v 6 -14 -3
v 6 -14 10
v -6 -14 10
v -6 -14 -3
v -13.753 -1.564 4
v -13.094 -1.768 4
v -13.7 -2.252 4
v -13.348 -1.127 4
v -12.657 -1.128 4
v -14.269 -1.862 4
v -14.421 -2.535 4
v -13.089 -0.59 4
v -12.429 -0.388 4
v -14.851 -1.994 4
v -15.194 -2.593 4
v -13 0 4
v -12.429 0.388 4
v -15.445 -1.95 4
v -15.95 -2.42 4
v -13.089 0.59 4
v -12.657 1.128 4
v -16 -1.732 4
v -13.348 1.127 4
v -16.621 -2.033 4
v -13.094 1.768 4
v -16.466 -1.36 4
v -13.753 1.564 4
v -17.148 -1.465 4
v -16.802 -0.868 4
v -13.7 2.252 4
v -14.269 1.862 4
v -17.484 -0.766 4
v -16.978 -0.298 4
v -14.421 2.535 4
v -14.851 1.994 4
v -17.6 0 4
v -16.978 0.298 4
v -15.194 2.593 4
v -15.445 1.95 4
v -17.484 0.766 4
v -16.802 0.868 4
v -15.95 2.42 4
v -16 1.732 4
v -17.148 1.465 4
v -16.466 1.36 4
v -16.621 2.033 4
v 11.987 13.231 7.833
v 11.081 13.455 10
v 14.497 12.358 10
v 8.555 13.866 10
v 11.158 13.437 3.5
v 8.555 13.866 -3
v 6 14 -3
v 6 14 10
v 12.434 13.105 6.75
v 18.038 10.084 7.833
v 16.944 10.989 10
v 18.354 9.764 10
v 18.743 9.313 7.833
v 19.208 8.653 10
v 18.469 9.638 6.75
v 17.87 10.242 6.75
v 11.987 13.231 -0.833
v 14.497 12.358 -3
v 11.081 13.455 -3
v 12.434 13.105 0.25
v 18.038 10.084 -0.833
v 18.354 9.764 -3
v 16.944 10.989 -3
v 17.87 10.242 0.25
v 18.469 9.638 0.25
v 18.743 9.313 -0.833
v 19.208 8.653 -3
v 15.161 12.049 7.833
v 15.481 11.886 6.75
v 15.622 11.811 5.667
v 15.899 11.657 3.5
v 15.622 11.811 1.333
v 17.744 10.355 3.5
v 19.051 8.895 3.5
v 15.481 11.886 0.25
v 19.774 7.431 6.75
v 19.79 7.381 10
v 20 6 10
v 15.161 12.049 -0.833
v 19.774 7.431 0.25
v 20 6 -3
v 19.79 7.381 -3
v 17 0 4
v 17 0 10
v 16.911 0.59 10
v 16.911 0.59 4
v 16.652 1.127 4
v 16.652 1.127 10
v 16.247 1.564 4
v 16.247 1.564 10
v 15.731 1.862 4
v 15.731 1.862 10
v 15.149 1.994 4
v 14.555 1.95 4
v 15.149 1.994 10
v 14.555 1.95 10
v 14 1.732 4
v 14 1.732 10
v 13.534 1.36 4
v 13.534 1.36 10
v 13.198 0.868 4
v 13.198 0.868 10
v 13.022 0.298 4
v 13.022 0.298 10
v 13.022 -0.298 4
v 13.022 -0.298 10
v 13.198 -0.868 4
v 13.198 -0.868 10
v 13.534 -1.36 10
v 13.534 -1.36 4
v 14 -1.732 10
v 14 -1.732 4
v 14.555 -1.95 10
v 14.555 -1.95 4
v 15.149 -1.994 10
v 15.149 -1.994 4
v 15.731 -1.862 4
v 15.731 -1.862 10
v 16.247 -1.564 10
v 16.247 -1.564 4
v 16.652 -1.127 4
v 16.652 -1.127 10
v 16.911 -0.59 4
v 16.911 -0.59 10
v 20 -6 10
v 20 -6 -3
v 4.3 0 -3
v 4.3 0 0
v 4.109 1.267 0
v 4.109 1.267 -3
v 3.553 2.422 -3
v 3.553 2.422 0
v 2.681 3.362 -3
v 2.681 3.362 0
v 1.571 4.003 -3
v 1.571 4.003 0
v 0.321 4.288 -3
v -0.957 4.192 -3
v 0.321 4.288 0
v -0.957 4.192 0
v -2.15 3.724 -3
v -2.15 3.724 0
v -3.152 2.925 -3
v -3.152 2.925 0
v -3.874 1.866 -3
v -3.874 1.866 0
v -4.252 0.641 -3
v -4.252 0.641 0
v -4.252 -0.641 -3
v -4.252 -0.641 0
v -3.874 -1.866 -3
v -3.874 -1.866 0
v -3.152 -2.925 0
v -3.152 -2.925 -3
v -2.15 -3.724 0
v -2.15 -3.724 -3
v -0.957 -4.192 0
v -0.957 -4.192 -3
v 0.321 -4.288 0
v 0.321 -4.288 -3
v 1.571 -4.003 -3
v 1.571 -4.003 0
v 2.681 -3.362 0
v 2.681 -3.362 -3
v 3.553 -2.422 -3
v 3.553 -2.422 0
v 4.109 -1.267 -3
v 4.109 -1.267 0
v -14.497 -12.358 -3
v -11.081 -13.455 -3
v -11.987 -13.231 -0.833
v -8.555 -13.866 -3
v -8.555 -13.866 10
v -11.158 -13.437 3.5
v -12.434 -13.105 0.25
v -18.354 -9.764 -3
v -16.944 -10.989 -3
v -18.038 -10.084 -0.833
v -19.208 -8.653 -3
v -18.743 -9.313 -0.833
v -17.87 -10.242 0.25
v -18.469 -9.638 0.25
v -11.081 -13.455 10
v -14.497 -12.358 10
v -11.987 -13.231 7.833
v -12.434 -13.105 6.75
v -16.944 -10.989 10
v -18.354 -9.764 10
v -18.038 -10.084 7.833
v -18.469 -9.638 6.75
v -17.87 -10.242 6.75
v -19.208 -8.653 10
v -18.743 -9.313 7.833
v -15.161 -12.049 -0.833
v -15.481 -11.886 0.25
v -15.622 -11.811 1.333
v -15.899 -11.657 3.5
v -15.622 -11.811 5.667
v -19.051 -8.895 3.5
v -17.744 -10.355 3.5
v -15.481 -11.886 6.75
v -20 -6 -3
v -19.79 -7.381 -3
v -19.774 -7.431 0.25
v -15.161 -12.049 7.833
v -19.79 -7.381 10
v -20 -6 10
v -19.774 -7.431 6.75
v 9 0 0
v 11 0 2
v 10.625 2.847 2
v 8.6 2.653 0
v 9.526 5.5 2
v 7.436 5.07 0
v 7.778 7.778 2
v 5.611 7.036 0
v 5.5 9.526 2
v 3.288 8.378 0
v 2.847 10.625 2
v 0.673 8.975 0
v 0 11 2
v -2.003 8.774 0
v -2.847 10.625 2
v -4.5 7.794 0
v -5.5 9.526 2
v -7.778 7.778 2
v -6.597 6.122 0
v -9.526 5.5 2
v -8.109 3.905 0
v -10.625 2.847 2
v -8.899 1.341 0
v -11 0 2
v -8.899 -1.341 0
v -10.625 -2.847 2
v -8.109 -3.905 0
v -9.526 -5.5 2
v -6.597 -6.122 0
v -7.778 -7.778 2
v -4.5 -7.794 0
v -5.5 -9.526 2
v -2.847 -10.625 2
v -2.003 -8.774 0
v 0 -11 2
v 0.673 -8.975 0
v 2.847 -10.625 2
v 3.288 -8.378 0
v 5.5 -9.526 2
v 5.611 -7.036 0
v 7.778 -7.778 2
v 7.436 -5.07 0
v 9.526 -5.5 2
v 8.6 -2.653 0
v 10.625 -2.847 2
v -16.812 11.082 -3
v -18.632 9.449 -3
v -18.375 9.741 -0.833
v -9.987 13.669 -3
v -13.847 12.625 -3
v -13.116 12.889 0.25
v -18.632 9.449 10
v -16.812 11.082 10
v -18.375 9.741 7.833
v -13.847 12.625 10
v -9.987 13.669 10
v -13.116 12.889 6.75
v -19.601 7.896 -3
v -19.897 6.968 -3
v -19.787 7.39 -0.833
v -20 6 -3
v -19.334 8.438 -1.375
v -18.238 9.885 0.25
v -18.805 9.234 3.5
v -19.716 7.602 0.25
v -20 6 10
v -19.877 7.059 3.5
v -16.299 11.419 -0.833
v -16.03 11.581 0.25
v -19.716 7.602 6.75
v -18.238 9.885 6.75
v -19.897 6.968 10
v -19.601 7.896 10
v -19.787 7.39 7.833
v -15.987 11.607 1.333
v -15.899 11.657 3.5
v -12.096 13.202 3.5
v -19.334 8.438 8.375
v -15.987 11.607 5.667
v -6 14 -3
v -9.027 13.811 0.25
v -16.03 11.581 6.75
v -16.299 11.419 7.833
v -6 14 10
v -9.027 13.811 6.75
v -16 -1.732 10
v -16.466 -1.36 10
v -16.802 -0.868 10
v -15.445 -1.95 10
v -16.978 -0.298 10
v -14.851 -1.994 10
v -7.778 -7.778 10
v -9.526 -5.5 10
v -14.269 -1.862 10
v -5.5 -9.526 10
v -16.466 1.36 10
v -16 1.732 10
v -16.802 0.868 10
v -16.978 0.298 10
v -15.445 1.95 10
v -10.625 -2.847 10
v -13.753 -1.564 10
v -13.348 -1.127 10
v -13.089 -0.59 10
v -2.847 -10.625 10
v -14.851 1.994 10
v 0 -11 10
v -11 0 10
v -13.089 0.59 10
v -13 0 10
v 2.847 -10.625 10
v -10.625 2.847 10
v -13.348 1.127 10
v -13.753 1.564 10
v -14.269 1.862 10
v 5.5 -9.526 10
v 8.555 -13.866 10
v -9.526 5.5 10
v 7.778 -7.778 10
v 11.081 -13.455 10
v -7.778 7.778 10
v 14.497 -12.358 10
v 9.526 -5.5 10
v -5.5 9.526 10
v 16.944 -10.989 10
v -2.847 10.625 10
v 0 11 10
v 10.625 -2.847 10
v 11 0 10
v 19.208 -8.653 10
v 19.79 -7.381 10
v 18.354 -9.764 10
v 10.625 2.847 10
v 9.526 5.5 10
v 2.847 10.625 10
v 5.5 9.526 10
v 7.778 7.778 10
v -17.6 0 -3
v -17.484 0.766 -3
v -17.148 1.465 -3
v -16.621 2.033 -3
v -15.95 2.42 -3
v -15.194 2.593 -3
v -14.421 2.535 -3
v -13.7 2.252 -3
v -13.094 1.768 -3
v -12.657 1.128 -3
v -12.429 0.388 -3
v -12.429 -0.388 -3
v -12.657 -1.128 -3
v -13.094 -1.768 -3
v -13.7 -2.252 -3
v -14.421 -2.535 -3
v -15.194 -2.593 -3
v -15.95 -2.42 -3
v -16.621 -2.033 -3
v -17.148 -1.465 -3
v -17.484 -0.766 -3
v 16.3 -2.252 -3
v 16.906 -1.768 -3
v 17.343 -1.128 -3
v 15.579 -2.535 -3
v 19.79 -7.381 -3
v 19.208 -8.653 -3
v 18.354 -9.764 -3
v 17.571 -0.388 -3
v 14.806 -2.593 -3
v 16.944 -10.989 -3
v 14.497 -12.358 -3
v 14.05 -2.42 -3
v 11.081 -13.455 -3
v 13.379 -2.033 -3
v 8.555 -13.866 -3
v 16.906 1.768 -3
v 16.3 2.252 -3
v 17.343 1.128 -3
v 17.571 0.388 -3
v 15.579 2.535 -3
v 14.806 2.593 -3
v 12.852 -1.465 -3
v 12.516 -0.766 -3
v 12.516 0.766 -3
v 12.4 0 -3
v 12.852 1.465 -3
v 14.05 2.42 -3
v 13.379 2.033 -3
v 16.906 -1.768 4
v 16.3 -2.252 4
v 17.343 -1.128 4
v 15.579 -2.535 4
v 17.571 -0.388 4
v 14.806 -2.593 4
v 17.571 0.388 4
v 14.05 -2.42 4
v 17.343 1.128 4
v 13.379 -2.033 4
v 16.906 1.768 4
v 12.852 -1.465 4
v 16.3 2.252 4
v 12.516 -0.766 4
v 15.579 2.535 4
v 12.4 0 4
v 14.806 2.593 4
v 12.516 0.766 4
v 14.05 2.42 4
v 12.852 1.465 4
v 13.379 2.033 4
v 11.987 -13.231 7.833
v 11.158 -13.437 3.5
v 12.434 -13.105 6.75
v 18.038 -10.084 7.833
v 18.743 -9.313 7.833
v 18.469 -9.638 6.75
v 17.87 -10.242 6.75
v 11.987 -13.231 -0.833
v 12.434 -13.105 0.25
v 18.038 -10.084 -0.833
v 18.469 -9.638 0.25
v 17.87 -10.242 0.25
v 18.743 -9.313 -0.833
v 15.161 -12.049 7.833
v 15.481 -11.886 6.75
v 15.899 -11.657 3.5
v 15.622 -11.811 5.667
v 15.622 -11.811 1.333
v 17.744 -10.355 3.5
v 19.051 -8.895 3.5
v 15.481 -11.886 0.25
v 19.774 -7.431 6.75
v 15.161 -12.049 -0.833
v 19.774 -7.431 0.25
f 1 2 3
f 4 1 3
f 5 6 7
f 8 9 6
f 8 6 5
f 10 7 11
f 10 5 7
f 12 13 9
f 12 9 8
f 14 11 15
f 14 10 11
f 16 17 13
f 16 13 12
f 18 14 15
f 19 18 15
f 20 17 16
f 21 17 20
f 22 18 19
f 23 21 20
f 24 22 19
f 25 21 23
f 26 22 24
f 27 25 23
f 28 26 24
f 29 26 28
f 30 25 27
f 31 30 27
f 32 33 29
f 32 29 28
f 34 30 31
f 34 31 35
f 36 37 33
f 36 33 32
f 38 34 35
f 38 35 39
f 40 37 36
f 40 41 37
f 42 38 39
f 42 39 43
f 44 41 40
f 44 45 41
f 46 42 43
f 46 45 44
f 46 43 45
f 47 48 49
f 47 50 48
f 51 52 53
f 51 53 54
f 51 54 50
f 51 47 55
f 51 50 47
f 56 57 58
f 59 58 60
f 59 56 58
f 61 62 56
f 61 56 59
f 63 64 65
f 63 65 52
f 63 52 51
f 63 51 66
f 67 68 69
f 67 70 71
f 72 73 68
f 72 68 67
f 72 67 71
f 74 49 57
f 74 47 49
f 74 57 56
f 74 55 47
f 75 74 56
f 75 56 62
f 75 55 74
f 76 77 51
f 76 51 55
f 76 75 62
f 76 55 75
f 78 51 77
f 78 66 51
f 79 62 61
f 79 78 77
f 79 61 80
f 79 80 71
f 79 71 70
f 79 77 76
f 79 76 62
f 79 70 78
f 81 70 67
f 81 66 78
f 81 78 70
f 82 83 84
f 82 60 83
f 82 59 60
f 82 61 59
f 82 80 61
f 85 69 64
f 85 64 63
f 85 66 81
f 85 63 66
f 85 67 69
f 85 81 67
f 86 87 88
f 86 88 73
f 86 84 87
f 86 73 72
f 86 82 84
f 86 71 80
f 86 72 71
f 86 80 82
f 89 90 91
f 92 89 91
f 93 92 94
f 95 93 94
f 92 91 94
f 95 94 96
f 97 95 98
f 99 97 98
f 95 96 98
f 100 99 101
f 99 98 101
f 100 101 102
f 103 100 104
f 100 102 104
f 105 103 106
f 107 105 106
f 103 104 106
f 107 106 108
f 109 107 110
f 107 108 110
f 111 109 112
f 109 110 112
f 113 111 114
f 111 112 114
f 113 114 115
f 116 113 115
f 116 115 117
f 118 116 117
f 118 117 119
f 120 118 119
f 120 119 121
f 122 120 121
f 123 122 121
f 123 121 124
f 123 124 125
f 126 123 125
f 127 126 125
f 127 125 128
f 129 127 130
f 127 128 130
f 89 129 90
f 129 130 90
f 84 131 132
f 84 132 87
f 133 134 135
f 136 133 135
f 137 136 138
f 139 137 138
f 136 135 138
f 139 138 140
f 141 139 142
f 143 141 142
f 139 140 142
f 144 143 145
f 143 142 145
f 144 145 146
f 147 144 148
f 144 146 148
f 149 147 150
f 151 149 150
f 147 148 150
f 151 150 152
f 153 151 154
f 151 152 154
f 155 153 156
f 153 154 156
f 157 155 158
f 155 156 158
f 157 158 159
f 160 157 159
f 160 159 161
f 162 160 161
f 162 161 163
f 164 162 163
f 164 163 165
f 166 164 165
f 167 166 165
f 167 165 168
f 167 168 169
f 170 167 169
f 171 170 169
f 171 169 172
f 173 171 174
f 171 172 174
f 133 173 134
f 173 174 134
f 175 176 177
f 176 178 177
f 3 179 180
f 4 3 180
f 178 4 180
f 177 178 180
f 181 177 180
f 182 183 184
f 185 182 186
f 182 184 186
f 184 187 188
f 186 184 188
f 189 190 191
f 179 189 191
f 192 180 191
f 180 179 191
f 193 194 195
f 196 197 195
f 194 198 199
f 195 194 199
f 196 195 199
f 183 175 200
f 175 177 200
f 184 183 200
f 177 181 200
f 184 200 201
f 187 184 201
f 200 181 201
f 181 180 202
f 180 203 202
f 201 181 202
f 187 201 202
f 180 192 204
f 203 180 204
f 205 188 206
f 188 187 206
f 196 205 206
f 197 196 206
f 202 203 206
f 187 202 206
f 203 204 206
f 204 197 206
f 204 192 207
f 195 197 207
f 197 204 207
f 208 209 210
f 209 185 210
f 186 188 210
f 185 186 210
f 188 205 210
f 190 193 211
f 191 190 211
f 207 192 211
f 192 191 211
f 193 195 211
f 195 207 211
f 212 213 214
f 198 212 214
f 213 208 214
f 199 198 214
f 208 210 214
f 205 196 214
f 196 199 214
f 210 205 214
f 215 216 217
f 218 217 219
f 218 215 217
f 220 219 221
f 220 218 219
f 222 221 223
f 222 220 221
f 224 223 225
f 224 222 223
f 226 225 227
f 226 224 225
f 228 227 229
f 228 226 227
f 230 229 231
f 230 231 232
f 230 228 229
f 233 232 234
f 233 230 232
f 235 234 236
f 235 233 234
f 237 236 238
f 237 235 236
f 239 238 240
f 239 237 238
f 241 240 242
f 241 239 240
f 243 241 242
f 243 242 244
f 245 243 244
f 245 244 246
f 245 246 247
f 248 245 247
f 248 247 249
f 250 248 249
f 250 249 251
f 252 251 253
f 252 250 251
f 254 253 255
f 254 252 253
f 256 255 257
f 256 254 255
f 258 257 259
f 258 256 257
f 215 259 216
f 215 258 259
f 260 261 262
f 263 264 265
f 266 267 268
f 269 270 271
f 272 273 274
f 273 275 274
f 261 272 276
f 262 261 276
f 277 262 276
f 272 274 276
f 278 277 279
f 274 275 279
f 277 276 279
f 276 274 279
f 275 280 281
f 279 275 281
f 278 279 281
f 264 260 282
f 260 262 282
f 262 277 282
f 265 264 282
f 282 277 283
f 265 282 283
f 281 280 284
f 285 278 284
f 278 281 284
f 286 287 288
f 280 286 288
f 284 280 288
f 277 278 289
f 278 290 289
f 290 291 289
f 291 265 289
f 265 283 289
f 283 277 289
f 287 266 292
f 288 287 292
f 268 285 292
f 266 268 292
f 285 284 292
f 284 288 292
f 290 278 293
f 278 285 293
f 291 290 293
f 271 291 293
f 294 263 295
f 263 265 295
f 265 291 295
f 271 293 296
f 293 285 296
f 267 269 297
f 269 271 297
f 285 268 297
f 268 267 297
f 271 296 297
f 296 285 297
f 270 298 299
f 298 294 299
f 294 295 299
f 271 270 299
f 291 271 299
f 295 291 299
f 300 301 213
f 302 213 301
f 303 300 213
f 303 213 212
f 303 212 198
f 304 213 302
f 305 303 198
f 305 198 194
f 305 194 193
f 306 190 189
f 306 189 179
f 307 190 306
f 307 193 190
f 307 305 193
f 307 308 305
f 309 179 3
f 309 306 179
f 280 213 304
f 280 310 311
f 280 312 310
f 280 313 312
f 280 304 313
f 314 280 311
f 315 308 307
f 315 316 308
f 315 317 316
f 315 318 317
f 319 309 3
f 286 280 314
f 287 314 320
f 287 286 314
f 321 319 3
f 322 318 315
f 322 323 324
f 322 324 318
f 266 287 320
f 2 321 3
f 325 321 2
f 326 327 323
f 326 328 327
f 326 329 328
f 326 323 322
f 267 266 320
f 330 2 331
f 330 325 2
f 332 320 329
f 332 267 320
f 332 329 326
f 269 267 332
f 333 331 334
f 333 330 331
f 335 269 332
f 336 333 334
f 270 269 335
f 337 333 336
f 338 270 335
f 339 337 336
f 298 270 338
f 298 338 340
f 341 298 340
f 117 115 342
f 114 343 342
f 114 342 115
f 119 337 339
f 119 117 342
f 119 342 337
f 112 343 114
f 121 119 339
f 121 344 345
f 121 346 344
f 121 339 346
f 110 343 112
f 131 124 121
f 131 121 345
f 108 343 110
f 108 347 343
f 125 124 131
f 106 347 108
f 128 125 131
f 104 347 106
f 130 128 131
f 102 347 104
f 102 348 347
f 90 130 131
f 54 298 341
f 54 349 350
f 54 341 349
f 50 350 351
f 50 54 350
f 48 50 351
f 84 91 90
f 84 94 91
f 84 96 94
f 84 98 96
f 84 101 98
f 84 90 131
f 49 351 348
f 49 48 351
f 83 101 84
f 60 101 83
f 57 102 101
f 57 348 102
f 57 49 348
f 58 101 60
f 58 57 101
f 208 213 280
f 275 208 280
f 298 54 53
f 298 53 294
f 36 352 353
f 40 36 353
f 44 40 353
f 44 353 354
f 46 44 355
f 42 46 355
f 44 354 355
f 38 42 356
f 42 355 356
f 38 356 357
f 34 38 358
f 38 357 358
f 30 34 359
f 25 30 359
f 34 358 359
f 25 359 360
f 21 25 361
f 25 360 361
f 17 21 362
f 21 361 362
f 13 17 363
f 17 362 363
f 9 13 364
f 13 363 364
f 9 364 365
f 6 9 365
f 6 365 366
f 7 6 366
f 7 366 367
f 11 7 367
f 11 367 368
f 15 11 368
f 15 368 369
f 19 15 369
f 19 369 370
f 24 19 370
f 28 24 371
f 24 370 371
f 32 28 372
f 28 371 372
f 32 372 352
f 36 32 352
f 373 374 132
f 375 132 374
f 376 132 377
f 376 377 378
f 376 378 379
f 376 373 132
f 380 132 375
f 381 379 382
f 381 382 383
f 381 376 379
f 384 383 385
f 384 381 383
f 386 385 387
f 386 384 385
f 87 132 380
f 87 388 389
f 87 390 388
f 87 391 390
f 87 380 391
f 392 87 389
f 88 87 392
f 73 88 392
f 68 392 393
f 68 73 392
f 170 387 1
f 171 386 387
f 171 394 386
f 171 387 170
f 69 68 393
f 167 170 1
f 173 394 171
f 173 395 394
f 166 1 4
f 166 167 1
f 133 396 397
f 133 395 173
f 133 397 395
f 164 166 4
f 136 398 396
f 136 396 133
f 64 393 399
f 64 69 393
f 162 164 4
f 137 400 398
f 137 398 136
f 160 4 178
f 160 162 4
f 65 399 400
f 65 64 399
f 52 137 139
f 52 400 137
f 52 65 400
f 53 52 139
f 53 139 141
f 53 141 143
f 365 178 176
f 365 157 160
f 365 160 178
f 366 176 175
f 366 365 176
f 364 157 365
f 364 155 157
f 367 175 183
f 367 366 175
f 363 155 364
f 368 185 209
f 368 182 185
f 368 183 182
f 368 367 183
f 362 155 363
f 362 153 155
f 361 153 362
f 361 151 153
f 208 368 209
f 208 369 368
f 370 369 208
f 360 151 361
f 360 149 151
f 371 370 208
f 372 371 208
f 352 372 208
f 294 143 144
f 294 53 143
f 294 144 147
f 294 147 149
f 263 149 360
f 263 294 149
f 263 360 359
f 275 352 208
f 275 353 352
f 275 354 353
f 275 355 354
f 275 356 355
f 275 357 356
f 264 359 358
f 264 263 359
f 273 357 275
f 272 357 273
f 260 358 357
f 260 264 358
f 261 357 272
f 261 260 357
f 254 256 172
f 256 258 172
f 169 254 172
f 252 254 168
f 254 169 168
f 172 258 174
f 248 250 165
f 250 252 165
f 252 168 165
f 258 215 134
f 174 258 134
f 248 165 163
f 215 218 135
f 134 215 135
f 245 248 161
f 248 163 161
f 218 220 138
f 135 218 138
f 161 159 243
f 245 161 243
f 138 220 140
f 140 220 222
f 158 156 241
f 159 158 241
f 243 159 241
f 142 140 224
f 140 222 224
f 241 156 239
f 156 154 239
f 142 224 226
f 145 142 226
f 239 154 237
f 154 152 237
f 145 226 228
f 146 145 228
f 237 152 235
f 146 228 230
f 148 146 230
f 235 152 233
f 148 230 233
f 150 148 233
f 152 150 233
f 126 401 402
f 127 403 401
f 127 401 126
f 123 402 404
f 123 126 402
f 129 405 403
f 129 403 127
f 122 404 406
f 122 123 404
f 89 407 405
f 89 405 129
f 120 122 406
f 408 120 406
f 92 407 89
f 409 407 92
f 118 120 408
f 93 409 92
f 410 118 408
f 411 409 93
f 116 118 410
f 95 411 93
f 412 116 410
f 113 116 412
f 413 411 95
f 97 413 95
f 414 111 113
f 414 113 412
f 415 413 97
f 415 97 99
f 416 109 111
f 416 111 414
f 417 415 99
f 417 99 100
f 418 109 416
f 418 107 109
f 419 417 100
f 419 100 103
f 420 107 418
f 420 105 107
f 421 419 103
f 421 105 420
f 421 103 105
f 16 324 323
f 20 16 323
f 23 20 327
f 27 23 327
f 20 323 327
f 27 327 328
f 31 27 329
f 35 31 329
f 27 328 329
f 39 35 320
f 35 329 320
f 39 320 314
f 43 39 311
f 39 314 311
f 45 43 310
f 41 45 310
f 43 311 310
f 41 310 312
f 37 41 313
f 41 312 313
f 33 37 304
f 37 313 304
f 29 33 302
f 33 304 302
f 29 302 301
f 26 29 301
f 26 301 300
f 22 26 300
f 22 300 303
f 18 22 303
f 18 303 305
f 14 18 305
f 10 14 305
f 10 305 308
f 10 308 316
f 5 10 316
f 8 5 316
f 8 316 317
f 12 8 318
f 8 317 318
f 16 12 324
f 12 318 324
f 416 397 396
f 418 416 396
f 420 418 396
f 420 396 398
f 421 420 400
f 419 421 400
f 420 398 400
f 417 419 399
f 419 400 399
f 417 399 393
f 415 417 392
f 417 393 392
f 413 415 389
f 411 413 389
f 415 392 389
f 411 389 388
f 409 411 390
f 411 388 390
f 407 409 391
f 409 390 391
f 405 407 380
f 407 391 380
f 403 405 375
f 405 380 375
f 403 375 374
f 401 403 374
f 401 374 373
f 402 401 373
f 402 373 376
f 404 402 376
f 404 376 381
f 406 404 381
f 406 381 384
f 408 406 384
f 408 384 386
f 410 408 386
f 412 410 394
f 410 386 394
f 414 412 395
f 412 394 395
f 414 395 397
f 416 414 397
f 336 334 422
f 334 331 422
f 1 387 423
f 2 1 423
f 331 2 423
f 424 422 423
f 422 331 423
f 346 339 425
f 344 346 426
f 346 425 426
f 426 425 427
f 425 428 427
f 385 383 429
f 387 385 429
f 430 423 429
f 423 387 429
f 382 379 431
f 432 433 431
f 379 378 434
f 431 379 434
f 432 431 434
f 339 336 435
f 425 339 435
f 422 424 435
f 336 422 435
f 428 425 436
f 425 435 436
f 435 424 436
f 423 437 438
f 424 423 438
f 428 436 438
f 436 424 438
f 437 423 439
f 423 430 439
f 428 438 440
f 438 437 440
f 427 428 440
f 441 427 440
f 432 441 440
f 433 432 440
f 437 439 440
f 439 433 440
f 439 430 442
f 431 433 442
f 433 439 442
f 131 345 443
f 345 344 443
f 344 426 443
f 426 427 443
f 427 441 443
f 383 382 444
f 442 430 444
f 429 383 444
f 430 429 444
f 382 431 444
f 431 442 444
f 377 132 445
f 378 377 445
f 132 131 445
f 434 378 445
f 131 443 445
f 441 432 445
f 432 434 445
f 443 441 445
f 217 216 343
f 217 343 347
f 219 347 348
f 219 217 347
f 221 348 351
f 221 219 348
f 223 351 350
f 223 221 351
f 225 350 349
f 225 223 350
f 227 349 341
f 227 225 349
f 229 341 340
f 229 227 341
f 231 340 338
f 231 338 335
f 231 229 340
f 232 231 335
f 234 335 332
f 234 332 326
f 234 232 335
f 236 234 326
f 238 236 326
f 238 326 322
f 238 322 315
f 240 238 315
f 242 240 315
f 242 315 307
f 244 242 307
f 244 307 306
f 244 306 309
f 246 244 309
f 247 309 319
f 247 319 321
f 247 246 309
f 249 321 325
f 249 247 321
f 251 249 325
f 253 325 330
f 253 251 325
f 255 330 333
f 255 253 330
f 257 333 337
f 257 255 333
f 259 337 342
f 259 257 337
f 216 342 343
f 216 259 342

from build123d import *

# Parameters (mm, degrees)
SZKIC1_W                    = 40
SZKIC1_H                    = 28
SZKIC1_R                    = 11
DODANIE_WYCI_GNI_CIE1_DEPTH = 10
SZKIC2_W                    = 40
SZKIC2_H                    = 28
DODANIE_WYCI_GNI_CIE2_DEPTH = 3
SFAZOWANIE1_SIZE            = 2
SZKIC3_R                    = 4.3
WYTNIJ_WYCI_GNI_CIE1_DEPTH  = 3
SZKIC4_R                    = 2
WYTNIJ_WYCI_GNI_CIE2_DEPTH  = 6
ZAOKR_GLENIE1_SIZE          = 14
ZAOKR_GLENIE1_SIZE_2        = 8
ZAOKR_GLENIE2_SIZE          = 14
ZAOKR_GLENIE2_SIZE_2        = 8
SZKIC5_R                    = 2.6
WYTNIJ_WYCI_GNI_CIE3_DEPTH  = 7


with BuildPart() as part:
    # Szkic1 → Dodanie-wyciągnięcie1 (new body)
    with BuildSketch(Plane.XY):
        Rectangle(SZKIC1_W, SZKIC1_H)
        Circle(SZKIC1_R, mode=Mode.SUBTRACT)
    extrude(amount=DODANIE_WYCI_GNI_CIE1_DEPTH)

    # Szkic2 → Dodanie-wyciągnięcie2 (add)
    with BuildSketch(Plane(origin=(0, 0, 0), x_dir=(-1, 0, 0), z_dir=(0, 0, -1))):
        Rectangle(SZKIC2_W, SZKIC2_H)
    extrude(amount=DODANIE_WYCI_GNI_CIE2_DEPTH)

    # Sfazowanie1
    sfazowanie1_edges = [part.edges().sort_by_distance(p)[0] for p in [
        (-11, 0, 0),
    ]]
    chamfer(sfazowanie1_edges, length=SFAZOWANIE1_SIZE)

    # Szkic3 → Wytnij-wyciągnięcie1 (cut)
    with BuildSketch(Plane.XY):
        Circle(SZKIC3_R)
    extrude(amount=-WYTNIJ_WYCI_GNI_CIE1_DEPTH, mode=Mode.SUBTRACT)

    # Szkic4 → Wytnij-wyciągnięcie2 (cut)
    with BuildSketch(Plane.XY.offset(10)):
        with Locations((-15, 0)):
            Circle(SZKIC4_R)
        with Locations((15, 0)):
            Circle(SZKIC4_R)
    extrude(amount=-WYTNIJ_WYCI_GNI_CIE2_DEPTH, mode=Mode.SUBTRACT)

    # Zaokrąglenie1
    # an asymmetric fillet: 14, 8 mm, written as the material it takes off along each edge
    with BuildSketch(Plane(origin=(20, -14, -38), x_dir=(-1, 0, 0), z_dir=(0, 0, 1))) as zaokr_glenie1_piece_1:
        with BuildLine():
            Bezier((ZAOKR_GLENIE1_SIZE, 0), (0, 0), (0, -ZAOKR_GLENIE1_SIZE_2), weights=[1, 0.707106781, 1])
            Line((0, -ZAOKR_GLENIE1_SIZE_2), (0, 0))
            Line((0, 0), (ZAOKR_GLENIE1_SIZE, 0))
        make_face()
    extrude(amount=83, mode=Mode.SUBTRACT)
    with BuildSketch(Plane(origin=(-20, 14, 45), x_dir=(0, -1, 0), z_dir=(0, 0, -1))) as zaokr_glenie1_piece_2:
        with BuildLine():
            Bezier((ZAOKR_GLENIE1_SIZE_2, 0), (0, 0), (0, -ZAOKR_GLENIE1_SIZE), weights=[1, 0.707106781, 1])
            Line((0, -ZAOKR_GLENIE1_SIZE), (0, 0))
            Line((0, 0), (ZAOKR_GLENIE1_SIZE_2, 0))
        make_face()
    extrude(amount=83, mode=Mode.SUBTRACT)

    # Zaokrąglenie2
    # an asymmetric fillet: 14, 8 mm, written as the material it takes off along each edge
    with BuildSketch(Plane(origin=(20, 14, -38), x_dir=(-1, 0, 0), z_dir=(0, 0, 1))) as zaokr_glenie2_piece_1:
        with BuildLine():
            Bezier((ZAOKR_GLENIE2_SIZE, 0), (0, 0), (0, ZAOKR_GLENIE2_SIZE_2), weights=[1, 0.707106781, 1])
            Line((0, ZAOKR_GLENIE2_SIZE_2), (0, 0))
            Line((0, 0), (ZAOKR_GLENIE2_SIZE, 0))
        make_face()
    extrude(amount=83, mode=Mode.SUBTRACT)
    with BuildSketch(Plane(origin=(-20, -14, 45), x_dir=(1, 0, 0), z_dir=(0, 0, -1))) as zaokr_glenie2_piece_2:
        with BuildLine():
            Bezier((ZAOKR_GLENIE2_SIZE, 0), (0, 0), (0, -ZAOKR_GLENIE2_SIZE_2), weights=[1, 0.707106781, 1])
            Line((0, -ZAOKR_GLENIE2_SIZE_2), (0, 0))
            Line((0, 0), (ZAOKR_GLENIE2_SIZE, 0))
        make_face()
    extrude(amount=83, mode=Mode.SUBTRACT)

    # Szkic5 → Wytnij-wyciągnięcie3 (cut)
    with BuildSketch(Plane(origin=(0, 0, -3), x_dir=(-1, 0, 0), z_dir=(0, 0, -1))):
        with Locations((-15, 0)):
            Circle(SZKIC5_R)
        with Locations((15, 0)):
            Circle(SZKIC5_R)
    extrude(amount=-WYTNIJ_WYCI_GNI_CIE3_DEPTH, mode=Mode.SUBTRACT)


solid = part.part
